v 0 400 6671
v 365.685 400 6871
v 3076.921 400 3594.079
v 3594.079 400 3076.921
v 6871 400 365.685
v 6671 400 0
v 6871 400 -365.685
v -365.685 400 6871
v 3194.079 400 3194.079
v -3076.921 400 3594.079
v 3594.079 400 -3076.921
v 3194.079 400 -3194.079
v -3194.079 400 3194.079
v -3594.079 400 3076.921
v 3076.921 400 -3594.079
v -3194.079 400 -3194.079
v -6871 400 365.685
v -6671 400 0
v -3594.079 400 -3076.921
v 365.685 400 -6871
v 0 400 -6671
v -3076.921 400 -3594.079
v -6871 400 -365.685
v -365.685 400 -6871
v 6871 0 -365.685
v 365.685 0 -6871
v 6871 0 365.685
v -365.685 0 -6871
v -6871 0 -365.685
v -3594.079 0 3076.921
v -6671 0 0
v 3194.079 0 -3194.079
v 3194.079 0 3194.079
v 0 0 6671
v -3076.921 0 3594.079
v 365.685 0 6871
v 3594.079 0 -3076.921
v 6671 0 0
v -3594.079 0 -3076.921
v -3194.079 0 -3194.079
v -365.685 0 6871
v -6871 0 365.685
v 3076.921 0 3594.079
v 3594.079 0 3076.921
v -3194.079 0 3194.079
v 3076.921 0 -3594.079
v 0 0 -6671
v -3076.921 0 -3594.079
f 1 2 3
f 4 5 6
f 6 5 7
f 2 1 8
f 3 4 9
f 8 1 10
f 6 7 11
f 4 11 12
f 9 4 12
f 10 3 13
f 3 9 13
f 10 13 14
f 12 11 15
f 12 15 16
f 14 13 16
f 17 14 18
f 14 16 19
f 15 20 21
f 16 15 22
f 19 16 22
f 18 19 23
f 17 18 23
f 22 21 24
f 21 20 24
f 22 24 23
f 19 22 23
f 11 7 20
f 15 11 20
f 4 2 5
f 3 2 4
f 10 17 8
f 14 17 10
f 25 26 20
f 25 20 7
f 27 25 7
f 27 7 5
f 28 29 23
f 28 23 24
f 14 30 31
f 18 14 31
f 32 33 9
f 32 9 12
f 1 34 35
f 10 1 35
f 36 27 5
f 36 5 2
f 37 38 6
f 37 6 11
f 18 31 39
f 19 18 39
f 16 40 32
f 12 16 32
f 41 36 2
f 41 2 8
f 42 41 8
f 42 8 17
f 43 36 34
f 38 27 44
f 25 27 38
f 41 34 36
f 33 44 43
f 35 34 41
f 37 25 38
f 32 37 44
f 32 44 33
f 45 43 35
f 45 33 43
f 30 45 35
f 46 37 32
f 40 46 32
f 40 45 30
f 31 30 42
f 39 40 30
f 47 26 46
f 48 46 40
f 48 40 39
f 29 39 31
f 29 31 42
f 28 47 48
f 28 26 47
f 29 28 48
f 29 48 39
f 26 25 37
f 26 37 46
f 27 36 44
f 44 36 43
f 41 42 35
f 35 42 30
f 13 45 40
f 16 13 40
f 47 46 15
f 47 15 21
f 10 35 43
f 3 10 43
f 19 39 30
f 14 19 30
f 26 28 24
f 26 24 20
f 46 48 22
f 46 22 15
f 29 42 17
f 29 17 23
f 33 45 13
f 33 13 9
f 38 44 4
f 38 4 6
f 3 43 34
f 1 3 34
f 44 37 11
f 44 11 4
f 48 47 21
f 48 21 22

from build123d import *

# Parameters (mm, degrees)
SKETCH2_W           = 6388.157287526
SKETCH2_H           = 6388.157287526
BOSS_EXTRUDE1_DEPTH = 400


with BuildPart() as part:
    # Sketch2 → Boss-Extrude1 (new body)
    with BuildSketch(Plane(origin=(0, 0, 0), x_dir=(1, 0, 0), z_dir=(0, 1, 0))):
        Polygon((-365.685424949, 6871), (-6871, 365.685424949), (-6871, -365.685424949), (-365.685424949, -6871), (365.685424949, -6871), (6871, -365.685424949), (6871, 365.685424949), (365.685424949, 6871), align=None)
        Polygon((3076.921356237, -3594.078643763), (0, -6671), (-3076.921356237, -3594.078643763), align=None, mode=Mode.SUBTRACT)
        Polygon((3594.078643763, 3076.921356237), (6671, 0), (3594.078643763, -3076.921356237), align=None, mode=Mode.SUBTRACT)
        Polygon((-3594.078643763, -3076.921356237), (-6671, 0), (-3594.078643763, 3076.921356237), align=None, mode=Mode.SUBTRACT)
        Rectangle(SKETCH2_W, SKETCH2_H, mode=Mode.SUBTRACT)
        Polygon((3076.921356237, 3594.078643763), (-3076.921356237, 3594.078643763), (0, 6671), align=None, mode=Mode.SUBTRACT)
    extrude(amount=BOSS_EXTRUDE1_DEPTH)


solid = part.part
